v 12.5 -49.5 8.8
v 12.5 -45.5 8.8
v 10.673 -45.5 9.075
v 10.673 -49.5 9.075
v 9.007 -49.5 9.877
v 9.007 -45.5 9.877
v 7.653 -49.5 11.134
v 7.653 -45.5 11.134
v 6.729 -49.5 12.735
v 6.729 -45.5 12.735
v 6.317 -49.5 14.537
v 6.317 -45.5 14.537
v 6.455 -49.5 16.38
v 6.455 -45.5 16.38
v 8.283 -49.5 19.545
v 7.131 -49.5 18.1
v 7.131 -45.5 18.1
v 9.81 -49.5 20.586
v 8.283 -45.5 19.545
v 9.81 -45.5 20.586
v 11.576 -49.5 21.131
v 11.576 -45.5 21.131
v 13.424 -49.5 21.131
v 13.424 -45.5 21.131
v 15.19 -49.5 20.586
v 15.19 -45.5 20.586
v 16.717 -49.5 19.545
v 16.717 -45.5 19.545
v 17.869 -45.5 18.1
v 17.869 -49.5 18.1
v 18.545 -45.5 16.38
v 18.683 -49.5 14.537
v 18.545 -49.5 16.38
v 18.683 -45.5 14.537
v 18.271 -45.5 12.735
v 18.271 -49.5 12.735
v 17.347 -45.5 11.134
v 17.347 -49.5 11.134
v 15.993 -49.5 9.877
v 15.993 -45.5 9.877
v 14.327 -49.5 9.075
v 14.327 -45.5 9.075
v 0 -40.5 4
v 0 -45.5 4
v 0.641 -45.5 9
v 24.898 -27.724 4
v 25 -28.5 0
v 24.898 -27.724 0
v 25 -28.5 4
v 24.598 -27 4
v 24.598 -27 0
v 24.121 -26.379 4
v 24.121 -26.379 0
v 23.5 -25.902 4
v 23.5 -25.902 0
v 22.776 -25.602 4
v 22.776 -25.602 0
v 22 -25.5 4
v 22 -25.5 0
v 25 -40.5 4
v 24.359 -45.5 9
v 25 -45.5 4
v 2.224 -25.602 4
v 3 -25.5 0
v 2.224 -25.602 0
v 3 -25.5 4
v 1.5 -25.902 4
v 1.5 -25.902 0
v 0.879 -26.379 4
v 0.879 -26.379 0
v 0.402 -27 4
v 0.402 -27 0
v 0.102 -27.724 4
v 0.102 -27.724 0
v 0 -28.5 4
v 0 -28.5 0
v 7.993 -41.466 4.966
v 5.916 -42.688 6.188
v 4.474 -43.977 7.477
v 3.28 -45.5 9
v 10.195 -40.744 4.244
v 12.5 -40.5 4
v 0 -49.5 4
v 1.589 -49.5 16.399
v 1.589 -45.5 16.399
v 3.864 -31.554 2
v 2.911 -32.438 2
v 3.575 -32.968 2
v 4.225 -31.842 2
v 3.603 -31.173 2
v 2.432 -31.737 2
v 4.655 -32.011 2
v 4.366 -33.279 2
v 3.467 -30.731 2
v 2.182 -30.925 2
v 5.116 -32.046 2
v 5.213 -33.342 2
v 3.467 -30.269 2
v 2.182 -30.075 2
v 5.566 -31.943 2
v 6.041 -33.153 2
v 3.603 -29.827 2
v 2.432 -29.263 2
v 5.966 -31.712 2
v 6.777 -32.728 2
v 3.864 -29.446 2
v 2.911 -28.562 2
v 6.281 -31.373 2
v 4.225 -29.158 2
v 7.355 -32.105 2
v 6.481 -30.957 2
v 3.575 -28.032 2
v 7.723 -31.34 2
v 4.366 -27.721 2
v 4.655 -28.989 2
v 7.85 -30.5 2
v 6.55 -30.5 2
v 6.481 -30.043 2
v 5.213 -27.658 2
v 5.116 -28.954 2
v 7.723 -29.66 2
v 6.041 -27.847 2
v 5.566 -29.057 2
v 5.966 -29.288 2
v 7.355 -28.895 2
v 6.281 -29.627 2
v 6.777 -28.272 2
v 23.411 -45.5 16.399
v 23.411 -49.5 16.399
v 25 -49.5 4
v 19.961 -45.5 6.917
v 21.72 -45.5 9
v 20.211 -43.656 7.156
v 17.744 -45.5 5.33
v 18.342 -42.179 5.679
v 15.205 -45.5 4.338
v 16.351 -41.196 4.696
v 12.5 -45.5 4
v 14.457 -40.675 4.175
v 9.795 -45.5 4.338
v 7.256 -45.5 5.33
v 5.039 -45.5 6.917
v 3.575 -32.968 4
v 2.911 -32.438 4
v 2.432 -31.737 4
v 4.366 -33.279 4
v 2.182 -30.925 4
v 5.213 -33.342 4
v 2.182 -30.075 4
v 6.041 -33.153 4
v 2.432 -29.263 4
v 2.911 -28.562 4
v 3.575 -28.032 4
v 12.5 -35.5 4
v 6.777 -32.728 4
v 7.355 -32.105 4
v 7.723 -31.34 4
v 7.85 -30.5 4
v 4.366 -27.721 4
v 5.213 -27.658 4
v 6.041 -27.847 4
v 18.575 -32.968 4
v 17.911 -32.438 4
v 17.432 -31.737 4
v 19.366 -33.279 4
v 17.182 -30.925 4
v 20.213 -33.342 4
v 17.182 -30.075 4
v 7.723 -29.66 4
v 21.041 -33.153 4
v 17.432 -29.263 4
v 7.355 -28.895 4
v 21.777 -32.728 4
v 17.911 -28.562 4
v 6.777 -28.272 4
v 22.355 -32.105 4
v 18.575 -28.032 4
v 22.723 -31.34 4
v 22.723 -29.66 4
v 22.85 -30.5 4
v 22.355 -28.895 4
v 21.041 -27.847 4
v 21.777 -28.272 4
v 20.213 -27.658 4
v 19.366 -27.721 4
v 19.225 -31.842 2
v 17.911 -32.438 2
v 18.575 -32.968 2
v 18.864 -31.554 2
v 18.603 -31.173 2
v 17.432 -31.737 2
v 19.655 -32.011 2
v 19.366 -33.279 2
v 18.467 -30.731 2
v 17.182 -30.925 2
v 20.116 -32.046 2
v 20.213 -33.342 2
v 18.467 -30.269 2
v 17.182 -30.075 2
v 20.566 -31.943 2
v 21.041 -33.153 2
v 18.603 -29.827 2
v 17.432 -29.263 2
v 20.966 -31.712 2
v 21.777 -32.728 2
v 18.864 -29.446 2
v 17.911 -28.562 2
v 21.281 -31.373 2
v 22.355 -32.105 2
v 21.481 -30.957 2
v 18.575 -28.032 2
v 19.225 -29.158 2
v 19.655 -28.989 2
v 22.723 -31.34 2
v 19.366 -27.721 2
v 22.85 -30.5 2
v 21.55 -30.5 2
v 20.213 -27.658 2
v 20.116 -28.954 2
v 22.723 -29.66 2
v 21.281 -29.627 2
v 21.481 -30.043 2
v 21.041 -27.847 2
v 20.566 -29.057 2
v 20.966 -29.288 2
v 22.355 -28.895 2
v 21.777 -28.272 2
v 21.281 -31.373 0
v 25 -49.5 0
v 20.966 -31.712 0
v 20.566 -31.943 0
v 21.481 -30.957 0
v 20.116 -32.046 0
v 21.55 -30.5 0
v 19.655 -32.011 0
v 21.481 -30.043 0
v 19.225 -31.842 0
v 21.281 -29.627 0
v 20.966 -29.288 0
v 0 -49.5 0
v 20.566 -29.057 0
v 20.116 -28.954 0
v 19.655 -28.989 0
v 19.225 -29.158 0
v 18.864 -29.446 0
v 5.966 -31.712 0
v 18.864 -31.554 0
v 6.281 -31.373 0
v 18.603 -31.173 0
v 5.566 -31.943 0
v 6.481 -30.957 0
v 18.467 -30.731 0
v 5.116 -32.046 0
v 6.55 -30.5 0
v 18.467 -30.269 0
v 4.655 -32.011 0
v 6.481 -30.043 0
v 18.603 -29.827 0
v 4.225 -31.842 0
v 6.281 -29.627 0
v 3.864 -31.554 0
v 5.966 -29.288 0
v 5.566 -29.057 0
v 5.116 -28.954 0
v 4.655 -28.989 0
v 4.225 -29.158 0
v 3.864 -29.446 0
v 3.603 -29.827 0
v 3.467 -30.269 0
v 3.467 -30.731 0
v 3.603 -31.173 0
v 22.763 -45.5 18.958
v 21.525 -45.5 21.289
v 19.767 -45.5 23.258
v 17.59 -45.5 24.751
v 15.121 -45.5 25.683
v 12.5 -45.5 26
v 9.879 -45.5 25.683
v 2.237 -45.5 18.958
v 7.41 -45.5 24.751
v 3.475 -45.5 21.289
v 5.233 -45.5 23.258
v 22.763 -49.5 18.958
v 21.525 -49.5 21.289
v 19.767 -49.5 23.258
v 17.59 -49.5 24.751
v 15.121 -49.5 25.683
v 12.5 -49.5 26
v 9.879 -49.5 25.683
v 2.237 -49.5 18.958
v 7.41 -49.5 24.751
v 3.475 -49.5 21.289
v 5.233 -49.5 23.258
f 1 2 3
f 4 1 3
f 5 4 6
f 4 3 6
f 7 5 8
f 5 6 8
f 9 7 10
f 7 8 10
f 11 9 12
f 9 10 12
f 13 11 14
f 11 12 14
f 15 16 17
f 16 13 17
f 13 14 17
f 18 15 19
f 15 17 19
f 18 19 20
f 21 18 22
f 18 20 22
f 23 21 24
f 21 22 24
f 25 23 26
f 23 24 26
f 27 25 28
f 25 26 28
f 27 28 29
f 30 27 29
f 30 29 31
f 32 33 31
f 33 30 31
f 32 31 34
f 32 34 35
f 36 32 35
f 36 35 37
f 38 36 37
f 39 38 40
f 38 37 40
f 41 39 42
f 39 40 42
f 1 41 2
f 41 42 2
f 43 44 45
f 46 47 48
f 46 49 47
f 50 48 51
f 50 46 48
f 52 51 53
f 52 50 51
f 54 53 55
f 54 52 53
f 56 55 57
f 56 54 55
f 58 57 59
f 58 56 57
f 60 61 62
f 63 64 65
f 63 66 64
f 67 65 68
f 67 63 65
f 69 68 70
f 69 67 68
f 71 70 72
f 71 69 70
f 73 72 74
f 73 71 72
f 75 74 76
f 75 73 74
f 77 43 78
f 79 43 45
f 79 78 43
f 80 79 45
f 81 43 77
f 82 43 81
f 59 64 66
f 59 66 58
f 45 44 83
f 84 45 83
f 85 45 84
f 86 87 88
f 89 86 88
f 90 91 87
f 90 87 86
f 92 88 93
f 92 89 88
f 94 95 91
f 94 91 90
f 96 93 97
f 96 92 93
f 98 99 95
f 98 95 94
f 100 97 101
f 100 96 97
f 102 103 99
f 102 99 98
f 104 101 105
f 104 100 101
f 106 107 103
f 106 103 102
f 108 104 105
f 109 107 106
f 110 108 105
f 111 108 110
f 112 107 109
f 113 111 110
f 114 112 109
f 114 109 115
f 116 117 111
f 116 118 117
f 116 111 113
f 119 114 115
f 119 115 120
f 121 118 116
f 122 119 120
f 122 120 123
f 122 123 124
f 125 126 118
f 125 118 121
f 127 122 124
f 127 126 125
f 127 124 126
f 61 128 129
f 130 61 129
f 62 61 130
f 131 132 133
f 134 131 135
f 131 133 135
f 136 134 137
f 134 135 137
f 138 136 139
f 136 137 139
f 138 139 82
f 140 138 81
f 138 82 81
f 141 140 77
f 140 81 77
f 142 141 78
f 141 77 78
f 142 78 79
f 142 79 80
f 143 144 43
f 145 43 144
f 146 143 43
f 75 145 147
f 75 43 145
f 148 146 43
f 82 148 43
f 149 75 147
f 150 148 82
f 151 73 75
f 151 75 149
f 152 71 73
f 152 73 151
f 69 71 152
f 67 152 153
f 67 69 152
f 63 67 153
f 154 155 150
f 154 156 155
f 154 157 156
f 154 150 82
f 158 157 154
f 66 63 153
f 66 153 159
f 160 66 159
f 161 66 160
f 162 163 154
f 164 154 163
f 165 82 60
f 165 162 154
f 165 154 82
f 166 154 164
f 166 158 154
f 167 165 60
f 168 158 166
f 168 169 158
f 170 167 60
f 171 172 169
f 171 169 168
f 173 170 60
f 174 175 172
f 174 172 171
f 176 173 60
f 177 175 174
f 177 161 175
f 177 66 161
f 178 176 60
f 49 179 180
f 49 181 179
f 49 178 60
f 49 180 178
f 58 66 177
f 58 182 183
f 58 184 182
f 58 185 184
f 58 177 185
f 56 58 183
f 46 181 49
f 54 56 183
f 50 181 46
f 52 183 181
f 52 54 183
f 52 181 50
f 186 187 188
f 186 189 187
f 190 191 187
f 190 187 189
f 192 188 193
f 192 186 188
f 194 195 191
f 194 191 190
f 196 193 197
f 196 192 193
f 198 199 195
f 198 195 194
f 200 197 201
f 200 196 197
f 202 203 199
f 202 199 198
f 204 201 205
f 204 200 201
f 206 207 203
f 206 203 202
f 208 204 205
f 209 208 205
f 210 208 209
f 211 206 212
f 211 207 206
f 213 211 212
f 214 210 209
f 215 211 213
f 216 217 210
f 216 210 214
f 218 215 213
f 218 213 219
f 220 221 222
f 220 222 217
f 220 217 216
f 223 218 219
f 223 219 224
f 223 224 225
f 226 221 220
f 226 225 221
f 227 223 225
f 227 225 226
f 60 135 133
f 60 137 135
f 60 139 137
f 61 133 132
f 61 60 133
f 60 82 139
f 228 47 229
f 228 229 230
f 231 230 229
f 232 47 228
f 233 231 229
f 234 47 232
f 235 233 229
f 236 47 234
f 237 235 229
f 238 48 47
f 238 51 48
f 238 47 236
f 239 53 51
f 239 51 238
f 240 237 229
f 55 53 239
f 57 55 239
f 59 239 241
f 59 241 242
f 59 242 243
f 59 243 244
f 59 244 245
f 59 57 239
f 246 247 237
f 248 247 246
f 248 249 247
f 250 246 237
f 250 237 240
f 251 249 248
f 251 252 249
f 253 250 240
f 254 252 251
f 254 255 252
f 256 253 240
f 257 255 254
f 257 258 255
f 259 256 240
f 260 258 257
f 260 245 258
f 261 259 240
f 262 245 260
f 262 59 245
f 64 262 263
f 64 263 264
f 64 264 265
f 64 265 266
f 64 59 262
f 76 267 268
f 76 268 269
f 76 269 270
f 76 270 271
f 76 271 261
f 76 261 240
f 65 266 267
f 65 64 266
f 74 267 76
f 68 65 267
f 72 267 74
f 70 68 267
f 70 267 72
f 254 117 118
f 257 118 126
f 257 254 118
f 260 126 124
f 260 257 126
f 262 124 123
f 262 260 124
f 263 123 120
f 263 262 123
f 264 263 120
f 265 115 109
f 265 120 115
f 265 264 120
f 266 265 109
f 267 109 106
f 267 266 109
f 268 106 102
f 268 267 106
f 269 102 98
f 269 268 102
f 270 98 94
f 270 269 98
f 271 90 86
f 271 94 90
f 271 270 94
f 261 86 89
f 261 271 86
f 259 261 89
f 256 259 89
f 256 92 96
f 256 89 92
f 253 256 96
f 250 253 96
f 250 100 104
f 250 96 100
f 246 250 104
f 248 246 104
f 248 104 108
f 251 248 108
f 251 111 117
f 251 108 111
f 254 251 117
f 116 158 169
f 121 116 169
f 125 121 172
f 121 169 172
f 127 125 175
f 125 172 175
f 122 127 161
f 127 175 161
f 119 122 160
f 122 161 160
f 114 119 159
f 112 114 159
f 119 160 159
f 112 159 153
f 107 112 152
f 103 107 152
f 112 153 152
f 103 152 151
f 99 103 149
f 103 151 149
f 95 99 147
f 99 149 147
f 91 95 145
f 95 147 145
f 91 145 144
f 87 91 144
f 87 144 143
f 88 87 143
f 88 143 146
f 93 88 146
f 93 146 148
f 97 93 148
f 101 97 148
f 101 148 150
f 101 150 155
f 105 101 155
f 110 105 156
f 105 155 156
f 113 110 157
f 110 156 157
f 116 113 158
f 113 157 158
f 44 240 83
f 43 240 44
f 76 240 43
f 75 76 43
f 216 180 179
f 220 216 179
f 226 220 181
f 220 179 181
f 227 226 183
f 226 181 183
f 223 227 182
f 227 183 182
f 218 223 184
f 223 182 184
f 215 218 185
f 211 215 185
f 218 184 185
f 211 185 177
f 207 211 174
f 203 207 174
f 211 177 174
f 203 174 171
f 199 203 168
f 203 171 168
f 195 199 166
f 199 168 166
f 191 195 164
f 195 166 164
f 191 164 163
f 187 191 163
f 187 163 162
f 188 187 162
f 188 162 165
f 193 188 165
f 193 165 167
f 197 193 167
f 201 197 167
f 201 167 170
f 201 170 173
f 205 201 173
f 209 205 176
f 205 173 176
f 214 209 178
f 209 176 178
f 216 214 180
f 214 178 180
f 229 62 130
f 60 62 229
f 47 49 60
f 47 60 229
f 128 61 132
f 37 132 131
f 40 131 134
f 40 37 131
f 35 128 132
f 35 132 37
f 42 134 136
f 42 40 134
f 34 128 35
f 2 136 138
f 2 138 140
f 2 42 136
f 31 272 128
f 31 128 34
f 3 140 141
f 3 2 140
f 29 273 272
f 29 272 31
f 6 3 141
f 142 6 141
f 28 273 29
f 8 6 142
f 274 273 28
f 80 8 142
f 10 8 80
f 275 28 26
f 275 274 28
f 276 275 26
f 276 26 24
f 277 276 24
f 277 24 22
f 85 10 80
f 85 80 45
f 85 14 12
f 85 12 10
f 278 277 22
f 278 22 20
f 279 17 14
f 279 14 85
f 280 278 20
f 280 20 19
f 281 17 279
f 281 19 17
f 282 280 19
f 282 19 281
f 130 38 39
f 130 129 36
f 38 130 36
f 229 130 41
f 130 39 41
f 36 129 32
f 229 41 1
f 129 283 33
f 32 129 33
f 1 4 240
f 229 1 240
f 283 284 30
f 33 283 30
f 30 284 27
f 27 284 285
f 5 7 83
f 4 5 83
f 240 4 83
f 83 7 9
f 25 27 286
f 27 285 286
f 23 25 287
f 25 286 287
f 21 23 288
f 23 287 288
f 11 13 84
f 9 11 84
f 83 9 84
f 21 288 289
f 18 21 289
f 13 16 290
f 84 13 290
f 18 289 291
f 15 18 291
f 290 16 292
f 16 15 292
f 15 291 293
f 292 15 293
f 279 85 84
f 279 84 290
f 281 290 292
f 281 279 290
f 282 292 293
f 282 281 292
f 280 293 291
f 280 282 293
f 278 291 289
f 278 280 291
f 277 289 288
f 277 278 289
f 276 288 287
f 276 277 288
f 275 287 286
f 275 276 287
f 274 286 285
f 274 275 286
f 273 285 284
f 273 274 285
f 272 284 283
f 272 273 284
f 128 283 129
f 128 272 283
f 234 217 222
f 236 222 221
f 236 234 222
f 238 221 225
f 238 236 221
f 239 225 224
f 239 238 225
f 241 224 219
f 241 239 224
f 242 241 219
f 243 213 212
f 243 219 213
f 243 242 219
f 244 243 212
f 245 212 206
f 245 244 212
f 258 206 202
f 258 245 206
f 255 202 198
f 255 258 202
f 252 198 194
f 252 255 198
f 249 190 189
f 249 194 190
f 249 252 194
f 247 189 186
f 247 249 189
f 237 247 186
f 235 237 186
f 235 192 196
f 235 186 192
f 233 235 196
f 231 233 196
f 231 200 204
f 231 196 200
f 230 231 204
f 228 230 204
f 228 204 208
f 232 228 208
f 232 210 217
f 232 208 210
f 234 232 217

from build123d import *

# Parameters (mm, degrees)
SKETCH1_W           = 25
SKETCH1_H           = 10
SKETCH1_R           = 1.55
BOSS_EXTRUDE1_DEPTH = 4
SKETCH2_W           = 25
SKETCH2_H           = 4
BOSS_EXTRUDE2_DEPTH = 10
SKETCH3_R           = 6.2
BOSS_EXTRUDE3_DEPTH = 4
CHAMFER1_SIZE       = 5
CUT_EXTRUDE1_START  = 10
SKETCH4_R           = 11
CUT_EXTRUDE1_DEPTH  = 10
FILLET1_R           = 3
SKETCH5_R           = 2.85
CUT_EXTRUDE2_DEPTH  = 2


with BuildPart() as part:
    # Sketch1 → Boss-Extrude1 (new body)
    with BuildSketch(Plane.XY):
        with Locations((12.5, -30.5)):
            Rectangle(SKETCH1_W, SKETCH1_H)
        with Locations((5, -30.5)):
            Circle(SKETCH1_R, mode=Mode.SUBTRACT)
        with Locations((20, -30.5)):
            Circle(SKETCH1_R, mode=Mode.SUBTRACT)
    extrude(amount=BOSS_EXTRUDE1_DEPTH)

    # Sketch2 → Boss-Extrude2 (add)
    with BuildSketch(Plane.XZ.offset(35.5)):
        with Locations((12.5, 2)):
            Rectangle(SKETCH2_W, SKETCH2_H)
    extrude(amount=BOSS_EXTRUDE2_DEPTH)

    # Sketch3 → Boss-Extrude3 (add)
    with BuildSketch(Plane.XZ.offset(45.5)):
        with BuildLine():
            Line((0, 4), (1.589269612, 16.398557259))
            ThreePointArc((1.589269612, 16.398557259), (12.5, 26), (23.410730388, 16.398557259))
            Line((23.410730388, 16.398557259), (25, 4))
            Line((25, 4), (25, 0))
            Line((25, 0), (0, 0))
            Line((0, 0), (0, 4))
        make_face()
        with Locations(Location((12.5, 15, 0), (0, 0, 270))):
            Circle(SKETCH3_R, mode=Mode.SUBTRACT)
    extrude(amount=BOSS_EXTRUDE3_DEPTH)

    # Chamfer1
    # the kernel refuses this chamfer: 5 mm, written as the material it adds along each edge
    with BuildSketch(Plane(origin=(25, -45.5, 4), x_dir=(0, 0.9996219169112968, -0.027495876610586403), z_dir=(-1, 0, 0))) as chamfer1_piece_1_section:
        Polygon((CHAMFER1_SIZE * 0.999621916911, -CHAMFER1_SIZE * 0.0274958766106), (-CHAMFER1_SIZE * 0.0274958766106, -CHAMFER1_SIZE * 0.999621916911), (0, 0), align=None)
    chamfer1_piece_1 = extrude(amount=25, mode=Mode.PRIVATE)
    chamfer1_piece_1 = split(chamfer1_piece_1, bisect_by=Plane(origin=(24.592329288, -43.84115056, 7.18040981), z_dir=(-0.9918845807033364, 0, -0.12714156898106382)), keep=Keep.TOP, mode=Mode.PRIVATE)
    chamfer1_piece_1 = split(chamfer1_piece_1, bisect_by=Plane(origin=(0.407670712, -43.84115056, 7.18040981), z_dir=(0.9918845807033364, 0, -0.12714156898106413)), keep=Keep.TOP, mode=Mode.PRIVATE)
    chamfer1_piece_1 = chamfer1_piece_1 - Plane(origin=(12.5, -43.84115056, 15), x_dir=(0, 0, -1), z_dir=(0, 1, 0)) * Cylinder(6.2, 70, mode=Mode.PRIVATE)
    add(chamfer1_piece_1)

    # Sketch4 → Cut-Extrude1 (cut)
    with BuildSketch(Plane(origin=(0, -45.5, 0), x_dir=(1, 0, 0), z_dir=(0, 1, 0)).offset(CUT_EXTRUDE1_START)):
        with Locations((12.5, -15)):
            Circle(SKETCH4_R)
    extrude(amount=-CUT_EXTRUDE1_DEPTH, mode=Mode.SUBTRACT)

    # Fillet1
    fillet1_edges = [part.edges().sort_by_distance(p)[0] for p in [
        (25, -25.5, 2),
        (0, -25.5, 2),
    ]]
    fillet(fillet1_edges, radius=FILLET1_R)

    # Sketch5 → Cut-Extrude2 (cut)
    with BuildSketch(Plane.XY.offset(4)):
        with Locations((20, -30.5)):
            Circle(SKETCH5_R)
        with Locations((5, -30.5)):
            Circle(SKETCH5_R)
    extrude(amount=-CUT_EXTRUDE2_DEPTH, mode=Mode.SUBTRACT)


solid = part.part
